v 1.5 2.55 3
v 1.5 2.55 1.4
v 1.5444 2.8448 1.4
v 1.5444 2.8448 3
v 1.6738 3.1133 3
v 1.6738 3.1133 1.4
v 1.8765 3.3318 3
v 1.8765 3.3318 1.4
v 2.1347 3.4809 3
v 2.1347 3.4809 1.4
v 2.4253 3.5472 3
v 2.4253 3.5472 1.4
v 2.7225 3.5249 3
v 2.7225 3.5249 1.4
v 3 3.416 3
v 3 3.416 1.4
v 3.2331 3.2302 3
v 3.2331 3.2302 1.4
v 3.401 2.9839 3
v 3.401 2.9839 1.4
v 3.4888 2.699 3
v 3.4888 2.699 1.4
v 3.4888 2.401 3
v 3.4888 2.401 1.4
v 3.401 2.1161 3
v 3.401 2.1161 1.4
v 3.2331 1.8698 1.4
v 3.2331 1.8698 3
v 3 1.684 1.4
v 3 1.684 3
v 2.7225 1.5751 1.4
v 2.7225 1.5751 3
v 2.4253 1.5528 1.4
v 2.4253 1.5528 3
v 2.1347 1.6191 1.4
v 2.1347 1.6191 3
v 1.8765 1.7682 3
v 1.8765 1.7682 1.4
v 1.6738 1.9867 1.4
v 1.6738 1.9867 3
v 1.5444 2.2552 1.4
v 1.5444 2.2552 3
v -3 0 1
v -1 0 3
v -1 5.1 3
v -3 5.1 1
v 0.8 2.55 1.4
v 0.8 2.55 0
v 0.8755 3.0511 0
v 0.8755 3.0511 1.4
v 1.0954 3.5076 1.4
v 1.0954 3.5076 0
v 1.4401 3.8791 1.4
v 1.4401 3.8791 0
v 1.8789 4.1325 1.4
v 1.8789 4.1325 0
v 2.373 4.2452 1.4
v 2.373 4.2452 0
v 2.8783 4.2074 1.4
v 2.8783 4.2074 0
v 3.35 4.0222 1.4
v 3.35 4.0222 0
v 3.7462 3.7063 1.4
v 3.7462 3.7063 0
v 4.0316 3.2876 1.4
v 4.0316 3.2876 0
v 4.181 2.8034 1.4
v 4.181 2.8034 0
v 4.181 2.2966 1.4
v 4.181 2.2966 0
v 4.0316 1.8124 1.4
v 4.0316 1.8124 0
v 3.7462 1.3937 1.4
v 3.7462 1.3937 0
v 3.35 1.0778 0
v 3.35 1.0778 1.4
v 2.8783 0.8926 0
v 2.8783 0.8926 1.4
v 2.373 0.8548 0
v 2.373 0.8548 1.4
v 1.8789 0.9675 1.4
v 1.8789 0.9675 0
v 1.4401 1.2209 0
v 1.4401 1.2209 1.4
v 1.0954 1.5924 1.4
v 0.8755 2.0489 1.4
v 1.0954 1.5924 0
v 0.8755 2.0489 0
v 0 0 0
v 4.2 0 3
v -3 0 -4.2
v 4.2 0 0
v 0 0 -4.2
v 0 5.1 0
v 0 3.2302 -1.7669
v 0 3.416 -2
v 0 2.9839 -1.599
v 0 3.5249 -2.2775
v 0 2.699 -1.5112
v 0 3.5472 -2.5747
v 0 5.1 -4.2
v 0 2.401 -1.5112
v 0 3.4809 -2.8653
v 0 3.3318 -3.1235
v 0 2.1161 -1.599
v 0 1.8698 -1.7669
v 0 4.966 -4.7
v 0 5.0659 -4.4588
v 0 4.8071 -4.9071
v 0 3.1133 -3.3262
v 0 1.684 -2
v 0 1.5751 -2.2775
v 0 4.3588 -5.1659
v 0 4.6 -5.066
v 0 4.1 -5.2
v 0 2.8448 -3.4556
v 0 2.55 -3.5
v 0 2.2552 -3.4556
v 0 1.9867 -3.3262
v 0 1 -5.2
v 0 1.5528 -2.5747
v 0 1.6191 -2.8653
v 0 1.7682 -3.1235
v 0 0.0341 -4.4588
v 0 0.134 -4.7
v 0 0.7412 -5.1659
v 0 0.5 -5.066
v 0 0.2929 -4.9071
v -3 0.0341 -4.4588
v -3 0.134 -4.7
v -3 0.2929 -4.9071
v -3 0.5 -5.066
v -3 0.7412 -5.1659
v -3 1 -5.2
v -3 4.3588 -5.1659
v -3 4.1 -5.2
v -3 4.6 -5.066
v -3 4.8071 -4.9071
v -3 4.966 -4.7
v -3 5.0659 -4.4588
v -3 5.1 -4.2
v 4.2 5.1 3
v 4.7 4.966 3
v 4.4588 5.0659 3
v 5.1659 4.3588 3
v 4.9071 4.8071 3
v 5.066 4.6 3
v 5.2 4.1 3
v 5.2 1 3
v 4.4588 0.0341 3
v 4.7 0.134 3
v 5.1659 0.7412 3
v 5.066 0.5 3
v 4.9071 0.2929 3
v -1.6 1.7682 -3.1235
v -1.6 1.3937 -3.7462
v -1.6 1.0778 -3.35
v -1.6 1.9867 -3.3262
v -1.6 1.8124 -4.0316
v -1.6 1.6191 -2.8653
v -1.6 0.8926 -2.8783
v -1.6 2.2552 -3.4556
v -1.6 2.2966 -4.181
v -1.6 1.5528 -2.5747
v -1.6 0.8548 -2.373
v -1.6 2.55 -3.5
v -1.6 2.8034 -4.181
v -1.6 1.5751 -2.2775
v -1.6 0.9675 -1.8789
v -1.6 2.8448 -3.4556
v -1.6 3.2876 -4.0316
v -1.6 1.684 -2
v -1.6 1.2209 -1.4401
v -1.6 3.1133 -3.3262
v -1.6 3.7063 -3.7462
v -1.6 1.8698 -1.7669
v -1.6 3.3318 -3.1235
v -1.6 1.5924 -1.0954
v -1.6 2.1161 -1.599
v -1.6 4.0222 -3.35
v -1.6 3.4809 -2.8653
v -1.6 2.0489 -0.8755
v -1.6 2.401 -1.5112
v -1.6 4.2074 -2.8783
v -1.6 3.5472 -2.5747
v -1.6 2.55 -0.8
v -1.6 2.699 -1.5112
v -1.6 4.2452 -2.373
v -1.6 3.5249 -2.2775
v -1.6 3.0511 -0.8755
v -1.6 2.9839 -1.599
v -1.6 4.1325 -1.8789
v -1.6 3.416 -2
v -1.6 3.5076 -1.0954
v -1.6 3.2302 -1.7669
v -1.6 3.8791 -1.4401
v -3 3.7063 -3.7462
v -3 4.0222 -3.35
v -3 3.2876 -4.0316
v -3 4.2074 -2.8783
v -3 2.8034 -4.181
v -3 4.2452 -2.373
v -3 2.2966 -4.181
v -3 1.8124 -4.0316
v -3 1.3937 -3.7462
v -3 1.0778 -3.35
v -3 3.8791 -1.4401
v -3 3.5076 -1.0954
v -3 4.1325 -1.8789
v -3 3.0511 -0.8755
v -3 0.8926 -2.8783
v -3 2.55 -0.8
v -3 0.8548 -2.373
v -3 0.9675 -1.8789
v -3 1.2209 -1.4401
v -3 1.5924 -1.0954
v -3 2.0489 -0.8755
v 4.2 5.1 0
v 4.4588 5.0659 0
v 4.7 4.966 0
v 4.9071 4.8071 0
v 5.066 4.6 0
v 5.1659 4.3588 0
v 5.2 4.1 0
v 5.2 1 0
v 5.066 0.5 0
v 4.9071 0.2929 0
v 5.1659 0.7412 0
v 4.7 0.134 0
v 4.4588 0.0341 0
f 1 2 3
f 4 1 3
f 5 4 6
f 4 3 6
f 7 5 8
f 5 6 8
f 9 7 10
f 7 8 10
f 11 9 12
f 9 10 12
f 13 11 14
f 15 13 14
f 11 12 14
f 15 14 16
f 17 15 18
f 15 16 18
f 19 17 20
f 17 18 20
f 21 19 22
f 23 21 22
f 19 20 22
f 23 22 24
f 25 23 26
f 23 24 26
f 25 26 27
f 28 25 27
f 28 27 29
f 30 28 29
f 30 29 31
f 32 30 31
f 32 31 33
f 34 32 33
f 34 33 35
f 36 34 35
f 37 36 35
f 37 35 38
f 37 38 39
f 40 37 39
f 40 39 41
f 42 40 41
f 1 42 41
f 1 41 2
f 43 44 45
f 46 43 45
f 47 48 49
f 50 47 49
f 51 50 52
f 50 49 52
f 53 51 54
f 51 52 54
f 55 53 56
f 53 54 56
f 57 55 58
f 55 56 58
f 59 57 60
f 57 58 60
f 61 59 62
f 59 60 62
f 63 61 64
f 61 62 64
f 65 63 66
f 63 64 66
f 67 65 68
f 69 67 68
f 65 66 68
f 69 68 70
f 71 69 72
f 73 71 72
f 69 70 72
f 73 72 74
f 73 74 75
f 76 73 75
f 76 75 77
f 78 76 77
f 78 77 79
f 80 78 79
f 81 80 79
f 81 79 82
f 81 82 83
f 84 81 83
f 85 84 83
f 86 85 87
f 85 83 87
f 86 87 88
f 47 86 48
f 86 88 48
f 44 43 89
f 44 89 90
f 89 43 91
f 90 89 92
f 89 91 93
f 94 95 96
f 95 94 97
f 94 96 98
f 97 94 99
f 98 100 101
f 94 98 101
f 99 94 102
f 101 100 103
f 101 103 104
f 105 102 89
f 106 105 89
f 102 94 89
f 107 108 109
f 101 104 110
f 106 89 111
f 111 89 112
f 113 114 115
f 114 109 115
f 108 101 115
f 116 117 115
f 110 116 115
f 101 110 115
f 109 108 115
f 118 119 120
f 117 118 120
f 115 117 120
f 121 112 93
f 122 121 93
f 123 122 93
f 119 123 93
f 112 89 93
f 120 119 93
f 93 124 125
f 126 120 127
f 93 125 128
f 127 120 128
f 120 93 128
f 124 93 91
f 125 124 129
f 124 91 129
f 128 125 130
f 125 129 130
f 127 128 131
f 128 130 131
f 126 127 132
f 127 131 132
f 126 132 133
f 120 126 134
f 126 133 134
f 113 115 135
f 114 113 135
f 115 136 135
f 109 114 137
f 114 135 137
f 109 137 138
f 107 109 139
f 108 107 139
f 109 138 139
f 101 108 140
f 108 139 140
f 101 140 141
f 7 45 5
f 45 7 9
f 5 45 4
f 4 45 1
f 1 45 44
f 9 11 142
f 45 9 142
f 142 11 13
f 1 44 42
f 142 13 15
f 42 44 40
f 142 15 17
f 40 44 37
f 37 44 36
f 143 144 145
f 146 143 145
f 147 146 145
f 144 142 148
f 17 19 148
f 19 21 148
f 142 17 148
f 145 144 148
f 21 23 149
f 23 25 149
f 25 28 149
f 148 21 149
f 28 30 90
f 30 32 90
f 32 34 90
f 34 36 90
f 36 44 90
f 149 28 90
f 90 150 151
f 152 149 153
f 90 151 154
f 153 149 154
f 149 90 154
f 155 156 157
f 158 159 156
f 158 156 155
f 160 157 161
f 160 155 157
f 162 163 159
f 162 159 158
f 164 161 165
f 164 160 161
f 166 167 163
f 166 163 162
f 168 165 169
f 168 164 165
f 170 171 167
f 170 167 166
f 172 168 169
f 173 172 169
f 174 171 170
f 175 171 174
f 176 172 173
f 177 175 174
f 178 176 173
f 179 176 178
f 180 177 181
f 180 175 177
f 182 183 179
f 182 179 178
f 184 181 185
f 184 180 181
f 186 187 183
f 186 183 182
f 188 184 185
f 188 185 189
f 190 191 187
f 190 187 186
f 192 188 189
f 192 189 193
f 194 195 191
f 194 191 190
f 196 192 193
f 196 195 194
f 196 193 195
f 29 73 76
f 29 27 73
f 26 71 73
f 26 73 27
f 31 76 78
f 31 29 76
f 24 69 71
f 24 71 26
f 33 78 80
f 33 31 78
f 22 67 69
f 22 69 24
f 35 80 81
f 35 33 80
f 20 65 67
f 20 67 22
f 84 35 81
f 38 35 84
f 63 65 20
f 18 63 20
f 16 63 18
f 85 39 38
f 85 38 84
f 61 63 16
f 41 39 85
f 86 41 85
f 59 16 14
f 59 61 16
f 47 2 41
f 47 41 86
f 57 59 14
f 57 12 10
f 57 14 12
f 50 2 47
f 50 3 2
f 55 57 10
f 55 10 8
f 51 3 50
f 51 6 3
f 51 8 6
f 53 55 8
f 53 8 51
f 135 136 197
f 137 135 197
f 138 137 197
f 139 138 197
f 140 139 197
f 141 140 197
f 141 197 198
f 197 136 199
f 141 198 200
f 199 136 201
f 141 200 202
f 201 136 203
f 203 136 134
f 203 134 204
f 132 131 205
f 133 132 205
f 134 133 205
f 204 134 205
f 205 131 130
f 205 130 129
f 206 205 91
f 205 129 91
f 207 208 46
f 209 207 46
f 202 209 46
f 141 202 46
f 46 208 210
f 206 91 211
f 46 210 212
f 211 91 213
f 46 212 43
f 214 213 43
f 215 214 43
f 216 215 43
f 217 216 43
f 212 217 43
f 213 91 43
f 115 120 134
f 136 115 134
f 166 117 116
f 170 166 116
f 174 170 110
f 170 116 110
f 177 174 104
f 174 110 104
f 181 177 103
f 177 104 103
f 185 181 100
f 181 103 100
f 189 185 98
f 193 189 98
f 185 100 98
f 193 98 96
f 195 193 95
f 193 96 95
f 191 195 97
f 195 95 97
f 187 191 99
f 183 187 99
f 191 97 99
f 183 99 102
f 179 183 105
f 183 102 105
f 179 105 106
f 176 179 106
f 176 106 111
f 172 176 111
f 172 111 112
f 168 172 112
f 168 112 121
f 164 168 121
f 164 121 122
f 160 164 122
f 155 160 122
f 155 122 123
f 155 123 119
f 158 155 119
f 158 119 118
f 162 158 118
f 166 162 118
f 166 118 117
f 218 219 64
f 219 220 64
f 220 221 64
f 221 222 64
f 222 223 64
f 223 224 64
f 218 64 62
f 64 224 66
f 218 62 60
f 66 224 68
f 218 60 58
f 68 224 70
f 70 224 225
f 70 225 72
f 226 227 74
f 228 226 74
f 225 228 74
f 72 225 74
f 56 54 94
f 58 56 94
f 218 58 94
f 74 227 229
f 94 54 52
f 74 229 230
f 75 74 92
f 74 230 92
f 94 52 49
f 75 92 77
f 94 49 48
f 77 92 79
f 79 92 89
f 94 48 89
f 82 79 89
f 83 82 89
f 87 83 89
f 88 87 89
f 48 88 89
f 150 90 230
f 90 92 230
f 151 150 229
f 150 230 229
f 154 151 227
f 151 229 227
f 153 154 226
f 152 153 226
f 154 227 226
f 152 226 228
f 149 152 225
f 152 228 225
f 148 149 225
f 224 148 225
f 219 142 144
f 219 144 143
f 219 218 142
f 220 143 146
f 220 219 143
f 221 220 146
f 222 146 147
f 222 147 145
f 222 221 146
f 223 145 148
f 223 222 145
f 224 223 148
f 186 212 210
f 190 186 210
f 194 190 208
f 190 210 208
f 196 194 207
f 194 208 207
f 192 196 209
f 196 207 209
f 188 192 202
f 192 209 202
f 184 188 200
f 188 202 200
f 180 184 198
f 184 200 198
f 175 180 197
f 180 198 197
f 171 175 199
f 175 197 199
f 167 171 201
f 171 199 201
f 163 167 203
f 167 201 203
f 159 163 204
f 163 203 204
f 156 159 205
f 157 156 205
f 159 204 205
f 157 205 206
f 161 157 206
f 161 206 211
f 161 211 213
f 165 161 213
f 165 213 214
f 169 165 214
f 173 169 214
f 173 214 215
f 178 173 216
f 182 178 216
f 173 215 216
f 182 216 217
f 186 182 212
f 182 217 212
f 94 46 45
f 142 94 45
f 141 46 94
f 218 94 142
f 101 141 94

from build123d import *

# Parameters (mm, degrees)
BOSS_EXTRUDE1_DEPTH = 5.1
CHAMFER1_SIZE       = 2
FILLET1_R           = 1
SKETCH3_R           = 1
CUT_EXTRUDE1_DEPTH  = 5.1
SKETCH4_R           = 1
CUT_EXTRUDE2_DEPTH  = 5.1
SKETCH5_R           = 1.7
CUT_EXTRUDE3_DEPTH  = 1.4
SKETCH6_R           = 1.7
CUT_EXTRUDE4_DEPTH  = 1.4


with BuildPart() as part:
    # Sketch1 → Boss-Extrude1 (new body)
    with BuildSketch(Plane(origin=(0, 0, 0), x_dir=(1, 0, 0), z_dir=(0, 1, 0))):
        Polygon((0, 0), (0, 5.2), (-3, 5.2), (-3, -3), (5.2, -3), (5.2, 0), align=None)
    extrude(amount=BOSS_EXTRUDE1_DEPTH)

    # Chamfer1
    chamfer1_edges = [part.edges().sort_by_distance(p)[0] for p in [
        (-3, 2.55, 3),
    ]]
    chamfer(chamfer1_edges, length=CHAMFER1_SIZE)

    # Fillet1
    fillet1_edges = [part.edges().sort_by_distance(p)[0] for p in [
        (-1.5, 5.1, -5.2),
        (5.2, 5.1, 1.5),
        (5.2, 0, 1.5),
        (-1.5, 0, -5.2),
    ]]
    fillet(fillet1_edges, radius=FILLET1_R)

    # Sketch3 → Cut-Extrude1 (cut)
    with BuildSketch(Plane(origin=(0, 0, 0), x_dir=(0, 0, -1), z_dir=(1, 0, 0))):
        with Locations((2.5, 2.55)):
            Circle(SKETCH3_R)
    extrude(amount=-CUT_EXTRUDE1_DEPTH, mode=Mode.SUBTRACT)

    # Sketch4 → Cut-Extrude2 (cut)
    with BuildSketch(Plane(origin=(0, 0, 0), x_dir=(-1, 0, 0), z_dir=(0, 0, -1))):
        with Locations((-2.5, 2.55)):
            Circle(SKETCH4_R)
    extrude(amount=-CUT_EXTRUDE2_DEPTH, mode=Mode.SUBTRACT)

    # Sketch5 → Cut-Extrude3 (cut)
    with BuildSketch(Plane(origin=(0, 0, 0), x_dir=(-1, 0, 0), z_dir=(0, 0, -1))):
        with Locations((-2.5, 2.55)):
            Circle(SKETCH5_R)
    extrude(amount=-CUT_EXTRUDE3_DEPTH, mode=Mode.SUBTRACT)

    # Sketch6 → Cut-Extrude4 (cut)
    with BuildSketch(Plane.ZY.offset(3)):
        with Locations((-2.5, 2.55)):
            Circle(SKETCH6_R)
    extrude(amount=-CUT_EXTRUDE4_DEPTH, mode=Mode.SUBTRACT)


solid = part.part
